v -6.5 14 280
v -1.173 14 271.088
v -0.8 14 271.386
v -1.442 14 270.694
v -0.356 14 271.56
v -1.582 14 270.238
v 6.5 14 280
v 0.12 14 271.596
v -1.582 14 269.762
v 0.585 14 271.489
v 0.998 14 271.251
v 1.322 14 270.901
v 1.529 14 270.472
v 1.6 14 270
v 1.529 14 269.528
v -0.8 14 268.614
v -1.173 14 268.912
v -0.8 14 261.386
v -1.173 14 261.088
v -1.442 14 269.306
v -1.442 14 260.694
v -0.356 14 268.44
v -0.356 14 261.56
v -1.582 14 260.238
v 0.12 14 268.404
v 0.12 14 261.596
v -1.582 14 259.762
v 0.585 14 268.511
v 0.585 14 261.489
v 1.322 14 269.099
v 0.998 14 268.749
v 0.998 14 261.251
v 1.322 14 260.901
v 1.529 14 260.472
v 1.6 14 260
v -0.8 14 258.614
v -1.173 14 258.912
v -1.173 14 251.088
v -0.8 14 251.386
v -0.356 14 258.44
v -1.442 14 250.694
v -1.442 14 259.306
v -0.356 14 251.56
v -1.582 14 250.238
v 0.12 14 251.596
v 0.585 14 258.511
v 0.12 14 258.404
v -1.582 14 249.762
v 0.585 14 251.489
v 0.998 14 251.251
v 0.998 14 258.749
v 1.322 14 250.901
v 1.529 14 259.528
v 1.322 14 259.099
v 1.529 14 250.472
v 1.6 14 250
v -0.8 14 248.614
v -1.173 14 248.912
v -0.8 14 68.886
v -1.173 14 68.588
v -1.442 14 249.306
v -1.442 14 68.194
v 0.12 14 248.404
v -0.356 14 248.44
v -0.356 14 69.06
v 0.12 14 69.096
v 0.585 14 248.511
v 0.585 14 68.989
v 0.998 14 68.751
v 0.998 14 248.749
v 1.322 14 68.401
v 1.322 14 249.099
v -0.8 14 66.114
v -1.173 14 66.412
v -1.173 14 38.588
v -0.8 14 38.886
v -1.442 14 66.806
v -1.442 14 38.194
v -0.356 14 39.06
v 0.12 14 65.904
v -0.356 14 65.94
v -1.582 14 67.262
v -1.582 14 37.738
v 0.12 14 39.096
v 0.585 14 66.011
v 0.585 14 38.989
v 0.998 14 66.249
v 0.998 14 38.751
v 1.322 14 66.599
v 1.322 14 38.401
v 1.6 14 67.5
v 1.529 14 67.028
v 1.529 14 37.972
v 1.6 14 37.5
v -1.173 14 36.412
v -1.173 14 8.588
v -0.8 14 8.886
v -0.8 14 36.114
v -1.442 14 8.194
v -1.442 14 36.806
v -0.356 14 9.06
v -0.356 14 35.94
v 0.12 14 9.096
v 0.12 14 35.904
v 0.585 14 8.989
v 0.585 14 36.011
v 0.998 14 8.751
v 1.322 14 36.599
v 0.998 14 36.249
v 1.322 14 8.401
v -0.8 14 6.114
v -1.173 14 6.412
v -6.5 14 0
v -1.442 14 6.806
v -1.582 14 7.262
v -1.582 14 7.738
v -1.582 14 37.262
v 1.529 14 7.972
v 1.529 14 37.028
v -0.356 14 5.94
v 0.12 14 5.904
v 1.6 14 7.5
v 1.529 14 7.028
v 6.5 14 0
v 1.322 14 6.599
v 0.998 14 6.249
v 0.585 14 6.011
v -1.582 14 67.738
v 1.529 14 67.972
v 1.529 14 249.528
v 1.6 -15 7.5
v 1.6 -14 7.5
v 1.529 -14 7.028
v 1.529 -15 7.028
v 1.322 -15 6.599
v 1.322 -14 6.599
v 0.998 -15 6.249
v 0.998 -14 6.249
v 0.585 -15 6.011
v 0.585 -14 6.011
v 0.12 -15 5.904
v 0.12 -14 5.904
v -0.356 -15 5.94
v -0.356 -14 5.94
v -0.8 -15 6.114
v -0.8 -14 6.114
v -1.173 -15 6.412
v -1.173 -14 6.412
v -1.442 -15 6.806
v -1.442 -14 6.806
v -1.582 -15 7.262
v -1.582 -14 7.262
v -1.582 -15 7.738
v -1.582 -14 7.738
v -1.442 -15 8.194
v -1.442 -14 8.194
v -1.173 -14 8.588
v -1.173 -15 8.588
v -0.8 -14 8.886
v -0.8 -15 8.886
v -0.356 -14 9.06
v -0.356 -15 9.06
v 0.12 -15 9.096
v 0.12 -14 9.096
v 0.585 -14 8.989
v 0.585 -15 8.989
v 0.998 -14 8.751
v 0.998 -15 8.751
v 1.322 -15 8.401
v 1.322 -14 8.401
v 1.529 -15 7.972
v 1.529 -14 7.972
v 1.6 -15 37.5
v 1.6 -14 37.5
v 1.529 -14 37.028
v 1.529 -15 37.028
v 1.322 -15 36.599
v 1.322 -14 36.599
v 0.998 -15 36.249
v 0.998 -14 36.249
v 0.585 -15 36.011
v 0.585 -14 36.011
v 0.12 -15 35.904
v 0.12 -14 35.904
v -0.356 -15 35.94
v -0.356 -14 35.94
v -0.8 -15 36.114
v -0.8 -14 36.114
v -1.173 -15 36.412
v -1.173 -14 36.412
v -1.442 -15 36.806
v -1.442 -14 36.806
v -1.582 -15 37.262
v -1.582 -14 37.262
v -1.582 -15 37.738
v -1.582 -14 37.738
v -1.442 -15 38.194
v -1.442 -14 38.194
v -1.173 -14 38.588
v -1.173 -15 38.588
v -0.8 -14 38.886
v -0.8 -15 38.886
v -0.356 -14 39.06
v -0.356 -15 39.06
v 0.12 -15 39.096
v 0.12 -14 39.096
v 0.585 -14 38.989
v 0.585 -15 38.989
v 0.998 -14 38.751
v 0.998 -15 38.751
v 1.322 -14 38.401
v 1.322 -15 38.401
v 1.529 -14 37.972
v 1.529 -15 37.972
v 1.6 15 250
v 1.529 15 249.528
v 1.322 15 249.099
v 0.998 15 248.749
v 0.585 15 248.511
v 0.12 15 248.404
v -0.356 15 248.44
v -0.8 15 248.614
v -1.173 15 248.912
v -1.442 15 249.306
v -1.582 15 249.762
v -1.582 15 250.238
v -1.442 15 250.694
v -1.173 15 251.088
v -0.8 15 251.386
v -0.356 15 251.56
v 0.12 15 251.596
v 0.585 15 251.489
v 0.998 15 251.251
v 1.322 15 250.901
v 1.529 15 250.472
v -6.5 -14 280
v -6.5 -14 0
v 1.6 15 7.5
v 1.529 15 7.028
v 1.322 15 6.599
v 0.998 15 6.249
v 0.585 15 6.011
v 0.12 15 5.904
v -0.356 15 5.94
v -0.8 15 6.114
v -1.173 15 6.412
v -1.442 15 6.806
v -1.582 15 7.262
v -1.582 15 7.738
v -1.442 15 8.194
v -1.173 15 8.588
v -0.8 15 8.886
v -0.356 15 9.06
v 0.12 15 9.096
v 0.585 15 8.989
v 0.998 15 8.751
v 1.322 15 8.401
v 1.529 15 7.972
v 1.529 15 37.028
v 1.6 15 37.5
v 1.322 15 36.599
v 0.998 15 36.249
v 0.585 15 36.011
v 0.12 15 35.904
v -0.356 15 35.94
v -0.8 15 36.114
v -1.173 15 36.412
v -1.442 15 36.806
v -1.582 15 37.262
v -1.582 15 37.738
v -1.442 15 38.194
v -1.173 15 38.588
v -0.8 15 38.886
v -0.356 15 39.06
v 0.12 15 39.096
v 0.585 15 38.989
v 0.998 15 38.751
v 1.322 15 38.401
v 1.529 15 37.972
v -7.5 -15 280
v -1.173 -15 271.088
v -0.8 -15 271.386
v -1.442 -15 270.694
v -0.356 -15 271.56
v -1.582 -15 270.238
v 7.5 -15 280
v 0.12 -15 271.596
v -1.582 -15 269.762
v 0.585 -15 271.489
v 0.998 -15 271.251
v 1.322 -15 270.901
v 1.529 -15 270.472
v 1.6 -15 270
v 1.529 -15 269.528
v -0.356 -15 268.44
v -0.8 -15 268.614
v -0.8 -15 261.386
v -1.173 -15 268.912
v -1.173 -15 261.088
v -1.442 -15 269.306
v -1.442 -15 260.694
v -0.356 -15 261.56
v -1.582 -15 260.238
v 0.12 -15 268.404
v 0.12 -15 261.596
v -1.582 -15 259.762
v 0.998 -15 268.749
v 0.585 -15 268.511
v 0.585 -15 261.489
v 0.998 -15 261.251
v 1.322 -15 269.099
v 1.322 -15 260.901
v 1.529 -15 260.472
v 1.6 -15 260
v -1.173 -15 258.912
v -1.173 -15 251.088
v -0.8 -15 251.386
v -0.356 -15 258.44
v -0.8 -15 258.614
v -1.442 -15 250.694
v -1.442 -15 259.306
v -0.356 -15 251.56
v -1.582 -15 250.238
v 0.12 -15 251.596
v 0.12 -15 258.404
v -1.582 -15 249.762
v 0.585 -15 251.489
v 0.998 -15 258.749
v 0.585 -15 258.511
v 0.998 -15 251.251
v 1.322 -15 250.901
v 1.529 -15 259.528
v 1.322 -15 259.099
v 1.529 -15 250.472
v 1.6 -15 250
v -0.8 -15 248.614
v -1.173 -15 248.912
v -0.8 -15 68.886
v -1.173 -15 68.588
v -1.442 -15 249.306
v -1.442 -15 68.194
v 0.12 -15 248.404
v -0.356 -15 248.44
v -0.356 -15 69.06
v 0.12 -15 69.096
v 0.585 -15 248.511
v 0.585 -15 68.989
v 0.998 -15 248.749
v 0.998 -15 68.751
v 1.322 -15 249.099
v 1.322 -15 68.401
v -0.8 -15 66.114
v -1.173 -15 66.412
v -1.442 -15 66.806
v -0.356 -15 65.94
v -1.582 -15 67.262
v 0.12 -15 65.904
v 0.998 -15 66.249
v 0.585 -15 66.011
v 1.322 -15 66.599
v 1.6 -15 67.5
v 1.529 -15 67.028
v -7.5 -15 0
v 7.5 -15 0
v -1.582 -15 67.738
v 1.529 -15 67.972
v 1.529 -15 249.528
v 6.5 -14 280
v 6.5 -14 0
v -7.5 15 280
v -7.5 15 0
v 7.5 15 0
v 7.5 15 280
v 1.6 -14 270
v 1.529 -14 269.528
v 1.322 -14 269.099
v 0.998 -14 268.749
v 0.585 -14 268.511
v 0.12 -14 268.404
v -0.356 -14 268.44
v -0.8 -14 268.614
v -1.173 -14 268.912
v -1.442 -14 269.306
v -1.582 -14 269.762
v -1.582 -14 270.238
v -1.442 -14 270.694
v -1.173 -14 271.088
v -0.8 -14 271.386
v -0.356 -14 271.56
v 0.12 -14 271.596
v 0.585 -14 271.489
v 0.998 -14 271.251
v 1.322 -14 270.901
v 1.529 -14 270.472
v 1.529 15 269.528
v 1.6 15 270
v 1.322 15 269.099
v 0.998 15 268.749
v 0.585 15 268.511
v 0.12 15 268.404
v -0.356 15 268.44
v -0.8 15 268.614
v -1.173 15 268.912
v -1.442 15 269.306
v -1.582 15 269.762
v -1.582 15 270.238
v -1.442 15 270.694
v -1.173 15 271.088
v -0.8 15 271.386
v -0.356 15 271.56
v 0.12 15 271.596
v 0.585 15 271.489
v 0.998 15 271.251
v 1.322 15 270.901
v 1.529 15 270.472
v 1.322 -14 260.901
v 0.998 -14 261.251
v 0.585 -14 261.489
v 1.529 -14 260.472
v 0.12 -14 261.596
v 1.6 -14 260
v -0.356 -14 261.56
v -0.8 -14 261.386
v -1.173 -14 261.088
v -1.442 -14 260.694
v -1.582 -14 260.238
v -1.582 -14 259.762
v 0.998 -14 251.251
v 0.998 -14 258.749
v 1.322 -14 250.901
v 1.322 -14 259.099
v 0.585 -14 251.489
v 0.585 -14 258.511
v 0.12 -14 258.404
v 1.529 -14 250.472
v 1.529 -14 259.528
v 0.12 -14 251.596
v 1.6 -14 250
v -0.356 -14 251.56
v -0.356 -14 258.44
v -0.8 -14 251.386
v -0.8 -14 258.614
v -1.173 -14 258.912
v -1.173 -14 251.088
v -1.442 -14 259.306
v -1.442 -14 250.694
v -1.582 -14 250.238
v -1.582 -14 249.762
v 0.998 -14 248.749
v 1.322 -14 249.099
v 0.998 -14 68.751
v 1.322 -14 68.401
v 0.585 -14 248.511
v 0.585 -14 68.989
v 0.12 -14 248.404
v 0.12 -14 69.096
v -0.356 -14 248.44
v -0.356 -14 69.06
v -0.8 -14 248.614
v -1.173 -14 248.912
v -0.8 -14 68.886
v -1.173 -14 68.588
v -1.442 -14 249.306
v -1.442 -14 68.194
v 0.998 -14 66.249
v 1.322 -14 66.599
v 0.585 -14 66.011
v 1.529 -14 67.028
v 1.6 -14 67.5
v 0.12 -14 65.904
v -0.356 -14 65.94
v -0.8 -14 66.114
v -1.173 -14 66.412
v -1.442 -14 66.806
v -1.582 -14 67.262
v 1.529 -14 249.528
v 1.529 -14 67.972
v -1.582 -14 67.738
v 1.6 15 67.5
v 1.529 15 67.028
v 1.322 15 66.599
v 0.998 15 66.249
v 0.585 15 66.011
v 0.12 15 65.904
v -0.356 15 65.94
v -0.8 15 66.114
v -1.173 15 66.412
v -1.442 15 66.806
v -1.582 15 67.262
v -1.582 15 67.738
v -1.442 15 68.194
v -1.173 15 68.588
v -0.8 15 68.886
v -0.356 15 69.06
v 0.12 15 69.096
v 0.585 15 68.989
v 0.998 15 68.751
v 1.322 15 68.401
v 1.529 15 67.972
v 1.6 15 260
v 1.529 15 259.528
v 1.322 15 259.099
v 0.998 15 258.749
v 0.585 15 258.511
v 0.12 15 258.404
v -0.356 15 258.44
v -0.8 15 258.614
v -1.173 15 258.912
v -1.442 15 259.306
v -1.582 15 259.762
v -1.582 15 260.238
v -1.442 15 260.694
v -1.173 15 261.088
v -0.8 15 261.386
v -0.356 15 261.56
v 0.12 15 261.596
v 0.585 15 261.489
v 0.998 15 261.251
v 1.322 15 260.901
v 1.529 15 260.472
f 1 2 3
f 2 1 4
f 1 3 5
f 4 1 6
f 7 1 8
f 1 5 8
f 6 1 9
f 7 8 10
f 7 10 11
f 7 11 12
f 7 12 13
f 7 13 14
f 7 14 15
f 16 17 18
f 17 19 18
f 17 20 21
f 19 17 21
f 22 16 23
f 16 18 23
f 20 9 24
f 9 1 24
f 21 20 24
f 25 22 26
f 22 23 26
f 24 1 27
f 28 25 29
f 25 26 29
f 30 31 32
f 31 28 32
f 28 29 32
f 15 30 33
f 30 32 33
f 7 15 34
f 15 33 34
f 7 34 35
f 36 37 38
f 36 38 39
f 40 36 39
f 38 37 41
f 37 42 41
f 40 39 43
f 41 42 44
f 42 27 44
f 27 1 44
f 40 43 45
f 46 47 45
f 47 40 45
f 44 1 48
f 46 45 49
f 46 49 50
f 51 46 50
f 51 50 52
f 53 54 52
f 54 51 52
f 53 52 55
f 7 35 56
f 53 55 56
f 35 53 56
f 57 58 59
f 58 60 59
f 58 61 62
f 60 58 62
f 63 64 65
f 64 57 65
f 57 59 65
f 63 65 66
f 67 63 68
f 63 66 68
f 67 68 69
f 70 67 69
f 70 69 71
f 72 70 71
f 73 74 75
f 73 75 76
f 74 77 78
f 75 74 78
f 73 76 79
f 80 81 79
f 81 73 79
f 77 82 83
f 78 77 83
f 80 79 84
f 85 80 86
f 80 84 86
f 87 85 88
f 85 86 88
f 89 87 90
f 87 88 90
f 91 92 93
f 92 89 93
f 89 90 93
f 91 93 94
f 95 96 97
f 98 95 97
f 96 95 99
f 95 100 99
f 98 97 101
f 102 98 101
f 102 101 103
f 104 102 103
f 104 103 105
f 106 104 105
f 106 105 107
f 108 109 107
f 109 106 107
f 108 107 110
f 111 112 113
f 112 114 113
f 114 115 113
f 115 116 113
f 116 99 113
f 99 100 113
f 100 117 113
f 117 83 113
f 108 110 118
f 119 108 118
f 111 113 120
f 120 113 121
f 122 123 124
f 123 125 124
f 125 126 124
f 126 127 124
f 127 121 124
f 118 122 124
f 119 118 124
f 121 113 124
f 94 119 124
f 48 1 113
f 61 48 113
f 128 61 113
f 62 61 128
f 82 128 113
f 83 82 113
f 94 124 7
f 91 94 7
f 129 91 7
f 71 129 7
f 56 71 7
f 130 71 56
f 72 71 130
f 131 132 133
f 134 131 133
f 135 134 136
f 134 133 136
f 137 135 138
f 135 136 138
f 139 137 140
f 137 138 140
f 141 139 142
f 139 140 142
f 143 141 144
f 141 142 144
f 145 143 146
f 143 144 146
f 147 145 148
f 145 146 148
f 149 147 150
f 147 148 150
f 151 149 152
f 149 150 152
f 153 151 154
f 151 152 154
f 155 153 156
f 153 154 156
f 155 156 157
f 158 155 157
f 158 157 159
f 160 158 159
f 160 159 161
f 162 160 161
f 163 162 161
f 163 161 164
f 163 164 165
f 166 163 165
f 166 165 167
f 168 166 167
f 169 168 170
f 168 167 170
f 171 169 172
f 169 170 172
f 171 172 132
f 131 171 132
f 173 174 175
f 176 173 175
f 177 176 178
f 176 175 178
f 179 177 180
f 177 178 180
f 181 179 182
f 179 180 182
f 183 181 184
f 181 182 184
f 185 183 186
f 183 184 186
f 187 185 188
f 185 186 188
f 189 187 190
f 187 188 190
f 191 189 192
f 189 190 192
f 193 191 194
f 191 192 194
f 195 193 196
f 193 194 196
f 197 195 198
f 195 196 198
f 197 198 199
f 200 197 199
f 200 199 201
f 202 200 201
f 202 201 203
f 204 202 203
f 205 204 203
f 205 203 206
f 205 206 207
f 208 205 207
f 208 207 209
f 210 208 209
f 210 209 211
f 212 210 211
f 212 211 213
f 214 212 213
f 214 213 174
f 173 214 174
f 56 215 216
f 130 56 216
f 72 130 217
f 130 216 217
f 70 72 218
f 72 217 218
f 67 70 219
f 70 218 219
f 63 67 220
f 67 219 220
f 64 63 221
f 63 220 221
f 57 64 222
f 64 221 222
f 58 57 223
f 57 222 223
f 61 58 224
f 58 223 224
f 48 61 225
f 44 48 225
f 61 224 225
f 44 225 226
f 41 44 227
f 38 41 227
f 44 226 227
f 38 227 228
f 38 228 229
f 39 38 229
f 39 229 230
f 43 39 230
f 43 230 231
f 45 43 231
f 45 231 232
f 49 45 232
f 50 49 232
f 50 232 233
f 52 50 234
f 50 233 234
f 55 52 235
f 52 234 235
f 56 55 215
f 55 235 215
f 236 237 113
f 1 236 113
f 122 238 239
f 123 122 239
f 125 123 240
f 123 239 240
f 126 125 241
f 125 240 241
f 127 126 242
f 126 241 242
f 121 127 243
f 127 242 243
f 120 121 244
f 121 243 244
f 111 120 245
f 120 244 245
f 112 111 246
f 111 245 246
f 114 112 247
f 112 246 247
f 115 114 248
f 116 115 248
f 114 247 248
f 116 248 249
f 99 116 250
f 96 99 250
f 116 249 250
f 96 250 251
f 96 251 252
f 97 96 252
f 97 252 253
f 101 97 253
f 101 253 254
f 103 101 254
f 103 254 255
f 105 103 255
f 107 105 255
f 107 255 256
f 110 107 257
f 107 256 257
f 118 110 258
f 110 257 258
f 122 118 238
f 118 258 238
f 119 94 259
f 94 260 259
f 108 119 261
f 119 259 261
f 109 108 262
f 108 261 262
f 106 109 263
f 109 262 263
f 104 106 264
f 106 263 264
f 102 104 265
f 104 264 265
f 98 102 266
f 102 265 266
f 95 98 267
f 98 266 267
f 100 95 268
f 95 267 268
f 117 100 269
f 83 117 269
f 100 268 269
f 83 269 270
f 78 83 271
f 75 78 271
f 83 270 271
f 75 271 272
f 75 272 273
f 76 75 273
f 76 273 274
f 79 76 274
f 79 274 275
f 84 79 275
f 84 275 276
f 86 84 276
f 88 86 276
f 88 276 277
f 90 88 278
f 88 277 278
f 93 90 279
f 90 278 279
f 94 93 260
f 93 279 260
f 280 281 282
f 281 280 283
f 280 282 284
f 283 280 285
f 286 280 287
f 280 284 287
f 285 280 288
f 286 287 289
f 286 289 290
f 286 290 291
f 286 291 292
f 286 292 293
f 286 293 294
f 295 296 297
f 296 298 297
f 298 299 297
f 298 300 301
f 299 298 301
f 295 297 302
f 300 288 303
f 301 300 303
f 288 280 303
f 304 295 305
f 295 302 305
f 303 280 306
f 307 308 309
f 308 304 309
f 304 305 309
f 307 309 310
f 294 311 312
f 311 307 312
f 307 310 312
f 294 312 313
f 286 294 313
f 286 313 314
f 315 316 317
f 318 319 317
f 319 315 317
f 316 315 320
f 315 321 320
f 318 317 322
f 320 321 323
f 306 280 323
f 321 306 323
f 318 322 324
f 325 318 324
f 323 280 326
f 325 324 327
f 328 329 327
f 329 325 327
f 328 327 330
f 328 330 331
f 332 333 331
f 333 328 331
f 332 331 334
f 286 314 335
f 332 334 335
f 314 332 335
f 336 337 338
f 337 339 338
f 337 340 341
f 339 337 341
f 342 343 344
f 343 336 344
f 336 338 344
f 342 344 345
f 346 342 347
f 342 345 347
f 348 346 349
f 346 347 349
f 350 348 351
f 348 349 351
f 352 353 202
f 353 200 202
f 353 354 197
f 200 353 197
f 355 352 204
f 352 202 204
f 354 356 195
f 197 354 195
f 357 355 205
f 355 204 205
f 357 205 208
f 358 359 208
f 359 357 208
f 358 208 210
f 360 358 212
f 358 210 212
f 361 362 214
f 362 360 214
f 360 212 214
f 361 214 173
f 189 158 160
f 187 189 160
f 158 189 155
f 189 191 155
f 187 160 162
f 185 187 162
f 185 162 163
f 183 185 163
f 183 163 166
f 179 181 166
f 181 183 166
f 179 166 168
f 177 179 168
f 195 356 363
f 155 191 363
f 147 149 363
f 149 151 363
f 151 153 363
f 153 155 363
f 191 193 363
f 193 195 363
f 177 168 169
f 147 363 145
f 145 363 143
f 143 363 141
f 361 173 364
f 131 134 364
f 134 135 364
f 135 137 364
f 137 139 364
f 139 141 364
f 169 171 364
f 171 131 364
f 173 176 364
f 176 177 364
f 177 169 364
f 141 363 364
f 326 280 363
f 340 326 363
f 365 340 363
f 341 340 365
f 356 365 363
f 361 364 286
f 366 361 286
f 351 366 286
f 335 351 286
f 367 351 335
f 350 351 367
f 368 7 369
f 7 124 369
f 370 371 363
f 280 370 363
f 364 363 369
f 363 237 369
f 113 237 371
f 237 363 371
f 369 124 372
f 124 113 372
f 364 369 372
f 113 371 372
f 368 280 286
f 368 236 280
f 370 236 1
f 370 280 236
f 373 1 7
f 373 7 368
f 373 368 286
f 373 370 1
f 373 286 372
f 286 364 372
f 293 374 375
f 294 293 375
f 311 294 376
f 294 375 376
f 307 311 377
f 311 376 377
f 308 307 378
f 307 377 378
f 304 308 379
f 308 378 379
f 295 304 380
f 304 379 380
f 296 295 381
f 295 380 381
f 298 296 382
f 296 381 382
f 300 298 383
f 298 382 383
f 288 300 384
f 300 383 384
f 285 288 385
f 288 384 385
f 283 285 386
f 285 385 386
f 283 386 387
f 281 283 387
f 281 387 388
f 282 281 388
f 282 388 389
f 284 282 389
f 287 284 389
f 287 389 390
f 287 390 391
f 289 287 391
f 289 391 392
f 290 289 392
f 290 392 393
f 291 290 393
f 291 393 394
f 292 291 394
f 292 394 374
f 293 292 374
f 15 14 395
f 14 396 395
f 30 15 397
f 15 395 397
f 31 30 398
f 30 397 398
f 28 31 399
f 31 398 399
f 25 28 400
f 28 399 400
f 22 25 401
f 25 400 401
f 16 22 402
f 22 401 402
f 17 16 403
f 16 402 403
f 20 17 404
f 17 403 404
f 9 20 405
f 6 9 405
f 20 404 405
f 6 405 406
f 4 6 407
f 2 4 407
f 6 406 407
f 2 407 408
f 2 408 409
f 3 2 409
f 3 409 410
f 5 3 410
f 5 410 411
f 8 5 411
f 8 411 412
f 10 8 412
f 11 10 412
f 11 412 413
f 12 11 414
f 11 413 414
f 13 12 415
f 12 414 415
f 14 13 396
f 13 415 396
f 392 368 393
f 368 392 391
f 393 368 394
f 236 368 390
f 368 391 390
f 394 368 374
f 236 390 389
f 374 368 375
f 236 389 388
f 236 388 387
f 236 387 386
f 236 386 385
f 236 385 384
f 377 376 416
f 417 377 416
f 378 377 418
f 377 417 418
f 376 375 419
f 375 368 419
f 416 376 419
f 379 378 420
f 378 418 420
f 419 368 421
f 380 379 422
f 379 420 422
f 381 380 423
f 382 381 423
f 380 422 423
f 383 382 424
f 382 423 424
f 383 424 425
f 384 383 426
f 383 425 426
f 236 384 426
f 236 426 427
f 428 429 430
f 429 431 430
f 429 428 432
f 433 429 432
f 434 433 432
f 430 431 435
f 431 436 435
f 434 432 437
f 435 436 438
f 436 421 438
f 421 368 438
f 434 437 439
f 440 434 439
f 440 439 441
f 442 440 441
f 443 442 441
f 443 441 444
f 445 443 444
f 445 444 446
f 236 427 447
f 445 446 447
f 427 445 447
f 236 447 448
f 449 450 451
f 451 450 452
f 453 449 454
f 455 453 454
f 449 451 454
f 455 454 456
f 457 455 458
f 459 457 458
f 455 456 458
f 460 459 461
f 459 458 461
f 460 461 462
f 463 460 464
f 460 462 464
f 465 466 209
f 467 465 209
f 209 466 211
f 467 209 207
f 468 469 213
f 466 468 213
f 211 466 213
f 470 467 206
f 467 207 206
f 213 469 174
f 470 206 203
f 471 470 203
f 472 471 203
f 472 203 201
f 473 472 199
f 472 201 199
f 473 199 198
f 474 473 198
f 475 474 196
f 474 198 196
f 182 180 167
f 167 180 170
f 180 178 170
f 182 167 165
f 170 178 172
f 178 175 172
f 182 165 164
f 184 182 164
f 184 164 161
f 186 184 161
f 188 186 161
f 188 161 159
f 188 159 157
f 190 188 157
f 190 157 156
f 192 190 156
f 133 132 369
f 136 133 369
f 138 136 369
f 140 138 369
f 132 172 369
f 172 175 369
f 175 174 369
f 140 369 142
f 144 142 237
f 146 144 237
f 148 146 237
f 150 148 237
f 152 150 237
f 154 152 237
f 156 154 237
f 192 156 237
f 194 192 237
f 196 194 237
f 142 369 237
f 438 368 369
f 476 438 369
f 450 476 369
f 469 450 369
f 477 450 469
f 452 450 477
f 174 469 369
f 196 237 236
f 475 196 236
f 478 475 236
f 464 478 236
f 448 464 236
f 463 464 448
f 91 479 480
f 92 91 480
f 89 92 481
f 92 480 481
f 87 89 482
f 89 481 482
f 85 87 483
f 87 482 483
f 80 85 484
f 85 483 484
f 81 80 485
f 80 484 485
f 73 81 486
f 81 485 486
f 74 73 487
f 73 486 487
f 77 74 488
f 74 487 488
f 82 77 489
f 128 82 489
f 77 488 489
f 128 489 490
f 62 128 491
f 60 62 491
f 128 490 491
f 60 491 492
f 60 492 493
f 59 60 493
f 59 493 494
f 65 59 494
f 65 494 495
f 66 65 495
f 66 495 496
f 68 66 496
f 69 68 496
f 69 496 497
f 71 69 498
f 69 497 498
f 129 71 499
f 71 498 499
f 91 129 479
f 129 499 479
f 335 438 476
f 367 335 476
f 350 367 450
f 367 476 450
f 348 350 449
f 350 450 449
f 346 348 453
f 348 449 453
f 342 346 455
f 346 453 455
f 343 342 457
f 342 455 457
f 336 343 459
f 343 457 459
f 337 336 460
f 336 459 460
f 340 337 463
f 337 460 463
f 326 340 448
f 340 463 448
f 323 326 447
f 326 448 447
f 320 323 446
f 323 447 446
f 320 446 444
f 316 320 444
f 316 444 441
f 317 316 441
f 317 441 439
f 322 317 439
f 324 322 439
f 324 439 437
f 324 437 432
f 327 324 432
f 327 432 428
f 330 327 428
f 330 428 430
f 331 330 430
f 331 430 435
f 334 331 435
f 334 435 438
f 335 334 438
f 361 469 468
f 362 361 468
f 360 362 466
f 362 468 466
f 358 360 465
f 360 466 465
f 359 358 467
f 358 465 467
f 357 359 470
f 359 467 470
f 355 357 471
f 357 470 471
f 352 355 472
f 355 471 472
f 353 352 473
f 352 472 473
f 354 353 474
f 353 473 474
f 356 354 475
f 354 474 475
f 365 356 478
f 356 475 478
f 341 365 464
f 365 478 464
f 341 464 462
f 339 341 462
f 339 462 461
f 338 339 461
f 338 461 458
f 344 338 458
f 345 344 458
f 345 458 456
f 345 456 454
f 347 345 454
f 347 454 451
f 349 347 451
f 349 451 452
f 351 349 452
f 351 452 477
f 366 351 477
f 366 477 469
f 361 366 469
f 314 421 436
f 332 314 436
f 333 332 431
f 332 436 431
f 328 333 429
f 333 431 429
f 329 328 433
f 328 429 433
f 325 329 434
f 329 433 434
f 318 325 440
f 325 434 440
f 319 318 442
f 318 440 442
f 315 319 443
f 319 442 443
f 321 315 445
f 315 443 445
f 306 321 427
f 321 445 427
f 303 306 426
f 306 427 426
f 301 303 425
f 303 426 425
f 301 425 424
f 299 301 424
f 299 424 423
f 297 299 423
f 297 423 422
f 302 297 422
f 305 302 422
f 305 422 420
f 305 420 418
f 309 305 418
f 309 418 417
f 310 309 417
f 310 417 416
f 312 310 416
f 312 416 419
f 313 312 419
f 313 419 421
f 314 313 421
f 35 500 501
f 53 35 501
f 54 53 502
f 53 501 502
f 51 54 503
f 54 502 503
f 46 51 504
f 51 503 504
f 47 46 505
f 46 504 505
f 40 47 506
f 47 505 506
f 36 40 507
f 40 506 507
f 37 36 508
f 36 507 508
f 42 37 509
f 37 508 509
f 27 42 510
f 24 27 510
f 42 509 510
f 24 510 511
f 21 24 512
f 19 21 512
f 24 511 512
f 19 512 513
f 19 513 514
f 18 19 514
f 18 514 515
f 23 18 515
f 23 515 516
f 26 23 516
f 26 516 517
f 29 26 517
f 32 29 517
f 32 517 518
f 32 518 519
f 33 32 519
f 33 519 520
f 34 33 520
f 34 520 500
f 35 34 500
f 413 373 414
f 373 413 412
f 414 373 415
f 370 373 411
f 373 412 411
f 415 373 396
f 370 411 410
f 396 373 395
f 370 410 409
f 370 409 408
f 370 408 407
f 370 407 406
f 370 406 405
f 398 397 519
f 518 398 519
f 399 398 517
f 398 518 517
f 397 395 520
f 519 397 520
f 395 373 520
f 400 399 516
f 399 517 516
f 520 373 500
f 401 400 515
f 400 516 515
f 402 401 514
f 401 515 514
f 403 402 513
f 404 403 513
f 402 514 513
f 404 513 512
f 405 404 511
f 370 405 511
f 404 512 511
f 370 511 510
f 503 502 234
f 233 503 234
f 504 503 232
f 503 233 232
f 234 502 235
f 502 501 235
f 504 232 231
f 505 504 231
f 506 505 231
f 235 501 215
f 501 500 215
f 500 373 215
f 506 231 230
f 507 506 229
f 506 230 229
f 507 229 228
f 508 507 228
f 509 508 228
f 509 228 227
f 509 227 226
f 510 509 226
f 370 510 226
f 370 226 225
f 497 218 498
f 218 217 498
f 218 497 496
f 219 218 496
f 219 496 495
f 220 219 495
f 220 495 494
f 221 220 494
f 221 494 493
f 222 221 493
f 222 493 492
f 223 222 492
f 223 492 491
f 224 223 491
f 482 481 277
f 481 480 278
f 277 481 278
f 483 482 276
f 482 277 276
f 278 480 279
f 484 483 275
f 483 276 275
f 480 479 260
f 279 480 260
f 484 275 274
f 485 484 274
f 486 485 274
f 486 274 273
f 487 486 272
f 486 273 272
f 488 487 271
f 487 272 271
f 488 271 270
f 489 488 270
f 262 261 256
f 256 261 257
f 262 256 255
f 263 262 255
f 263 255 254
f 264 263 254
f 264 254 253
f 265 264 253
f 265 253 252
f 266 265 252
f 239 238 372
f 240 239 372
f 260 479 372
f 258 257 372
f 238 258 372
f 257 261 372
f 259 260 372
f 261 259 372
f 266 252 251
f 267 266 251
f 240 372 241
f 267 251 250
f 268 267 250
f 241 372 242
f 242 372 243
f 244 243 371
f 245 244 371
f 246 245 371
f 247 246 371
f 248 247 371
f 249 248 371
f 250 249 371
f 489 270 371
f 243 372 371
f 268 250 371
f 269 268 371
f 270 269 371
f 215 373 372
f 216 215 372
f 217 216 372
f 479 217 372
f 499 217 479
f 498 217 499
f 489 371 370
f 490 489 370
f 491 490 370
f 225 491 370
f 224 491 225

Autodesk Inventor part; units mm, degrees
ref_plane "YZ Plane" through (0, 0, 0) normal (1, 0, 0) x (0, 1, 0)
ref_plane "XZ Plane" through (0, 0, 0) normal (0, 1, 0) x (-1, 0, 0)
ref_plane "XY Plane" through (0, 0, 0) normal (0, 0, 1) x (1, 0, 0)
sketch "スケッチ1" plane through (0, 0, 0) normal (0, 0, 1) x (1, 0, 0)
  line L0 (7.5, 15) -> (-7.5, 15)
  line L1 (-7.5, 15) -> (-7.5, -15)
  line L2 (-7.5, -15) -> (7.5, -15)
  line L3 (7.5, -15) -> (7.5, 15)
  line L4 (7.5, 15) -> (-7.5, -15) construction
  line L5 (-7.5, 15) -> (7.5, -15) construction
  line L6 (-6.5, 14) -> (6.5, 14)
  line L7 (6.5, 14) -> (6.5, -14)
  line L8 (6.5, -14) -> (-6.5, -14)
  line L9 (-6.5, -14) -> (-6.5, 14)
  point P0 (0, 0)
  dimension "d0" = 15
  dimension "d1" = 30
  dimension "d2" = 1
extrude "押し出し1" add sketch "スケッチ1" along normal blind 280
sketch "スケッチ2" plane through (-7.5, 15, 0) normal (0, 1, 0) x (1, 0, 0)
  circle A0 centre (7.5, -7.5) radius 1.6
  circle A1 centre (7.5, -37.5) radius 1.6
  circle A2 centre (7.5, -67.5) radius 1.6
  line L0 (15, 0) -> (0, 0) projected
  circle A3 centre (7.5, -270) radius 1.6
  circle A4 centre (7.5, -260) radius 1.6
  circle A5 centre (7.5, -250) radius 1.6
  line L1 (15, -280) -> (0, -280) projected
  point P0 (7.5, 0)
  point P1 (7.5, 0)
  point P2 (7.5, -280)
  dimension "d5" = 3.2
  dimension "d6" = 3.2
  dimension "d7" = 3.2
  dimension "d8" = 7.5
  dimension "d9" = 30
  dimension "d10" = 30
  dimension "d11" = 3.2
  dimension "d12" = 3.2
  dimension "d13" = 3.2
  dimension "d14" = 10
  dimension "d15" = 10
  dimension "d16" = 10
extrude "押し出し2" cut sketch "スケッチ2" against normal through all
properties part number "アーム3_角柱1" material "アルミニウム 6061"
